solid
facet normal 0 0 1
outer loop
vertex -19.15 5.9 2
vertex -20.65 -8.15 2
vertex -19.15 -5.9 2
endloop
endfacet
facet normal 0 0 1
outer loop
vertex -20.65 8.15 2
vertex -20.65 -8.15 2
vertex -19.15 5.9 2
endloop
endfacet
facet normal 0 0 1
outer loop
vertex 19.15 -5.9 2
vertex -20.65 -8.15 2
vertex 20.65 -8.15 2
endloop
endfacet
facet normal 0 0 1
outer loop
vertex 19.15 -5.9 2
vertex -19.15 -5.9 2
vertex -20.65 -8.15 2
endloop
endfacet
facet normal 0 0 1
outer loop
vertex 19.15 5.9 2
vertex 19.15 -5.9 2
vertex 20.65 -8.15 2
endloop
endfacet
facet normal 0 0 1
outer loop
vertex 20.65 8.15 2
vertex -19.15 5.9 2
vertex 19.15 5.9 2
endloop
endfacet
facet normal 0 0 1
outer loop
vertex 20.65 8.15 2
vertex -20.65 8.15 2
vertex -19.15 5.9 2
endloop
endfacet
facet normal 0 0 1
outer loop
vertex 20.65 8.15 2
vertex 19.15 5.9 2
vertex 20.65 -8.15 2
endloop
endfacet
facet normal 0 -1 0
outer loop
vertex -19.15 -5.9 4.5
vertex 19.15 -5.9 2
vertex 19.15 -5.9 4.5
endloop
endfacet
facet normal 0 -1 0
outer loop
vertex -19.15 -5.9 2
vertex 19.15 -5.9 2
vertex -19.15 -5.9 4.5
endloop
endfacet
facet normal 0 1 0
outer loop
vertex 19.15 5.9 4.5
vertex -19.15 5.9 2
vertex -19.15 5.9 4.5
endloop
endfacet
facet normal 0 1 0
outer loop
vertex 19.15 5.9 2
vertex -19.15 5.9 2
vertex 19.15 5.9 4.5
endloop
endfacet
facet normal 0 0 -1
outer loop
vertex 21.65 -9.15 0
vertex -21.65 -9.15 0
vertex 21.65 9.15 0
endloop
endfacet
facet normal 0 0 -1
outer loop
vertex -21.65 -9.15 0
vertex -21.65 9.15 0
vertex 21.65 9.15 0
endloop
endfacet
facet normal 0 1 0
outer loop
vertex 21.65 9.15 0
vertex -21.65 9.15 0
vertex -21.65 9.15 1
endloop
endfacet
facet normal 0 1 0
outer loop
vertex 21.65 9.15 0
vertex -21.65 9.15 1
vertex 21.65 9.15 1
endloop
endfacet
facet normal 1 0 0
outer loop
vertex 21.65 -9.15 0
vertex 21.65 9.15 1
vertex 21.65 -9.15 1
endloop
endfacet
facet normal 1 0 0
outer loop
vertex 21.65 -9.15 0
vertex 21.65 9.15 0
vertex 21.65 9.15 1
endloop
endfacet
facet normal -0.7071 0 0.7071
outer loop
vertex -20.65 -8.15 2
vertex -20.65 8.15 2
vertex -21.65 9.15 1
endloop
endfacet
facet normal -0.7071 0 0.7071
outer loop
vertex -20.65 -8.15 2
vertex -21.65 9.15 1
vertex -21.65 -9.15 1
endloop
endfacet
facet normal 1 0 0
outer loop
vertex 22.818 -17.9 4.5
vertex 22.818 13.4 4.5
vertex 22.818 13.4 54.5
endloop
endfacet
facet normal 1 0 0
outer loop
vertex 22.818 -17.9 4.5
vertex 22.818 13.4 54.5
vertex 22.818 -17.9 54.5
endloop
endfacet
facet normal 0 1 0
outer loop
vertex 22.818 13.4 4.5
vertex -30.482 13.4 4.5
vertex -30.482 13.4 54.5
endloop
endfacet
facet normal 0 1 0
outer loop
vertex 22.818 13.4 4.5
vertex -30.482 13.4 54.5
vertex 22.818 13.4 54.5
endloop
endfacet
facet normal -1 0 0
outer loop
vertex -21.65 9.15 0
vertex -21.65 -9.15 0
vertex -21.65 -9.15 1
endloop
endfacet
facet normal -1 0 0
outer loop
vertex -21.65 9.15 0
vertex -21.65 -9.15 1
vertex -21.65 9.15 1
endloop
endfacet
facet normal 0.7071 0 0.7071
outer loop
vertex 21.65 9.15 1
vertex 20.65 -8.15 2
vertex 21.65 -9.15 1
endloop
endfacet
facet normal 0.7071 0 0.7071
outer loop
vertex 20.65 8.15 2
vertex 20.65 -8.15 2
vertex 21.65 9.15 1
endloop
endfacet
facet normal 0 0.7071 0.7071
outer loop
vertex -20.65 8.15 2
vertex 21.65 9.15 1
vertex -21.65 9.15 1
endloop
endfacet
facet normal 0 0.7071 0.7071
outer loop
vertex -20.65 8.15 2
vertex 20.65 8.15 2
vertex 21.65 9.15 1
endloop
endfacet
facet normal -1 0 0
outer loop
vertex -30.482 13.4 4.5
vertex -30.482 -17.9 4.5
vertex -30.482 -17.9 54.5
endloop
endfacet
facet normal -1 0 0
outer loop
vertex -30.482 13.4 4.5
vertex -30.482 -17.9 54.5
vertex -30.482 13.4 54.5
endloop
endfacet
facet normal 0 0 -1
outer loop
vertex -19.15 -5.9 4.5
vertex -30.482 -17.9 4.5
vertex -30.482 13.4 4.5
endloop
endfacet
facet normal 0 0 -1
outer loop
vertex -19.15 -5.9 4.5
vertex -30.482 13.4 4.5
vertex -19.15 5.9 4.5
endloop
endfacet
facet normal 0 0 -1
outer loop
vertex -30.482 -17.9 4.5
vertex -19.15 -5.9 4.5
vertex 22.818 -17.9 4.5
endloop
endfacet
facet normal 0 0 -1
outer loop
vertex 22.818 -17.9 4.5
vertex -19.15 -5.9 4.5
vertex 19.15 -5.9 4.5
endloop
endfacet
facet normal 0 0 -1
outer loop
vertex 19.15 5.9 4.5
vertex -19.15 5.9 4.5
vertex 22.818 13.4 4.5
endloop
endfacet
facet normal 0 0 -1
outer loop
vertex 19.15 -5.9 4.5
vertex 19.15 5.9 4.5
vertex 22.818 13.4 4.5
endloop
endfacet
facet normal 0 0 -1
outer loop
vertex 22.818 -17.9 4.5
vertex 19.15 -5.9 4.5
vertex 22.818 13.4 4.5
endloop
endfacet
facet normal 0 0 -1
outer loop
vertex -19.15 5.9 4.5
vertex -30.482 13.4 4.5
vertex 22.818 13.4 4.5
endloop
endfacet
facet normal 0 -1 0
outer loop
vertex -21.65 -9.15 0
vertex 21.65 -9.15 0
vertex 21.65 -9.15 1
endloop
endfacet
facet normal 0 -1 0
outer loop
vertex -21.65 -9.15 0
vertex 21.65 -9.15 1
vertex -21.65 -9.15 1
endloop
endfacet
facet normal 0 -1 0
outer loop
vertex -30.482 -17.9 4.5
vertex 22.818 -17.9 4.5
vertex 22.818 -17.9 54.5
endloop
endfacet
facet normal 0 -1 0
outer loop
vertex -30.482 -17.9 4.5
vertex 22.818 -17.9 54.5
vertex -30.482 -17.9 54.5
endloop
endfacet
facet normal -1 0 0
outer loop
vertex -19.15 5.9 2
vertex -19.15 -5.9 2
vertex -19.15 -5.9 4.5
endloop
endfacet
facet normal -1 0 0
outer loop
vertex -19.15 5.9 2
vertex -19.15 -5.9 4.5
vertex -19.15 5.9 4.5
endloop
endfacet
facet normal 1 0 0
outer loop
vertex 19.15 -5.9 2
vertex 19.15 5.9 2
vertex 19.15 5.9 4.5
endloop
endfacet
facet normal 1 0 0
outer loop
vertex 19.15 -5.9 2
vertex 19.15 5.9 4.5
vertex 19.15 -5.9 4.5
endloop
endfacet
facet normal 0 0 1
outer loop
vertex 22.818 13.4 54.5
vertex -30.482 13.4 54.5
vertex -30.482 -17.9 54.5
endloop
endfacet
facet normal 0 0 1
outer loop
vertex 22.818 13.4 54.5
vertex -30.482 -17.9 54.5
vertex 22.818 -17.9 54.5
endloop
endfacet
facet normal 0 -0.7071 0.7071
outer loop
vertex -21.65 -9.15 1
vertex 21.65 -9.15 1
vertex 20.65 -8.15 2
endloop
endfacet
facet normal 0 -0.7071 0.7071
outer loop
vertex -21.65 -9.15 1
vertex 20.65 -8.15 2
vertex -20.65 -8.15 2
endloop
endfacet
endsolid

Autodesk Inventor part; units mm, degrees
ref_plane "YZ Plane" through (0, 0, 0) normal (1, 0, 0) x (0, 1, 0)
ref_plane "XZ Plane" through (0, 0, 0) normal (0, 1, 0) x (-1, 0, 0)
ref_plane "XY Plane" through (0, 0, 0) normal (0, 0, 1) x (1, 0, 0)
sketch "Sketch1" plane through (0, 0, 0) normal (0, 0, 1) x (1, 0, 0)
  line L0 (-21.65, 9.15) -> (21.65, 9.15)
  line L1 (21.65, 9.15) -> (21.65, -9.15)
  line L2 (21.65, -9.15) -> (-21.65, -9.15)
  line L3 (-21.65, -9.15) -> (-21.65, 9.15)
  line L4 (-21.65, 9.15) -> (21.65, -9.15) construction
  line L5 (21.65, 9.15) -> (-21.65, -9.15) construction
  point P0 (0, 0)
  dimension "d0" = 43.3
  dimension "d1" = 18.3
extrude "Extrusion1" add sketch "Sketch1" along normal blind 2
sketch "Sketch2" plane through (0, 0, 2) normal (0, 0, 1) x (1, 0, 0)
  line L0 (-19.15, 5.9) -> (19.15, 5.9)
  line L1 (19.15, 5.9) -> (19.15, -5.9)
  line L2 (19.15, -5.9) -> (-19.15, -5.9)
  line L3 (-19.15, -5.9) -> (-19.15, 5.9)
  line L4 (-19.15, 5.9) -> (19.15, -5.9) construction
  line L5 (19.15, 5.9) -> (-19.15, -5.9) construction
  point P0 (0, 0)
  dimension "d4" = 38.3
  dimension "d5" = 11.8
extrude "Extrusion2" add sketch "Sketch2" along normal blind 2.5
chamfer "Chamfer1" distance 1 angle 45 4 edges at (0, -9.15, 2) (21.65, 0, 2) (-21.65, 0, 2) (0, 9.15, 2)
sketch "Sketch3" plane through (0, 0, 4.5) normal (0, 0, 1) x (1, 0, 0)
  line L0 (22.8185, -17.9) -> (-30.4815, -17.9)
  line L1 (-30.4815, -17.9) -> (-30.4815, 13.4)
  line L2 (-30.4815, 13.4) -> (22.8185, 13.4)
  line L3 (22.8185, 13.4) -> (22.8185, -17.9)
  line L4 (-30.4815, -17.9) -> (22.8185, 13.4) construction
  line L5 (19.15, 5.9) -> (-19.15, 5.9) projected
  line L6 (-19.15, -5.9) -> (19.15, -5.9) projected
  point P0 (0, 0)
  dimension "d11" = 53.3
  dimension "d12" = 7.5
  dimension "d13" = 12
extrude "Extrusion3" add sketch "Sketch3" along normal blind 50
properties part number "Power Socket Insert v1"
